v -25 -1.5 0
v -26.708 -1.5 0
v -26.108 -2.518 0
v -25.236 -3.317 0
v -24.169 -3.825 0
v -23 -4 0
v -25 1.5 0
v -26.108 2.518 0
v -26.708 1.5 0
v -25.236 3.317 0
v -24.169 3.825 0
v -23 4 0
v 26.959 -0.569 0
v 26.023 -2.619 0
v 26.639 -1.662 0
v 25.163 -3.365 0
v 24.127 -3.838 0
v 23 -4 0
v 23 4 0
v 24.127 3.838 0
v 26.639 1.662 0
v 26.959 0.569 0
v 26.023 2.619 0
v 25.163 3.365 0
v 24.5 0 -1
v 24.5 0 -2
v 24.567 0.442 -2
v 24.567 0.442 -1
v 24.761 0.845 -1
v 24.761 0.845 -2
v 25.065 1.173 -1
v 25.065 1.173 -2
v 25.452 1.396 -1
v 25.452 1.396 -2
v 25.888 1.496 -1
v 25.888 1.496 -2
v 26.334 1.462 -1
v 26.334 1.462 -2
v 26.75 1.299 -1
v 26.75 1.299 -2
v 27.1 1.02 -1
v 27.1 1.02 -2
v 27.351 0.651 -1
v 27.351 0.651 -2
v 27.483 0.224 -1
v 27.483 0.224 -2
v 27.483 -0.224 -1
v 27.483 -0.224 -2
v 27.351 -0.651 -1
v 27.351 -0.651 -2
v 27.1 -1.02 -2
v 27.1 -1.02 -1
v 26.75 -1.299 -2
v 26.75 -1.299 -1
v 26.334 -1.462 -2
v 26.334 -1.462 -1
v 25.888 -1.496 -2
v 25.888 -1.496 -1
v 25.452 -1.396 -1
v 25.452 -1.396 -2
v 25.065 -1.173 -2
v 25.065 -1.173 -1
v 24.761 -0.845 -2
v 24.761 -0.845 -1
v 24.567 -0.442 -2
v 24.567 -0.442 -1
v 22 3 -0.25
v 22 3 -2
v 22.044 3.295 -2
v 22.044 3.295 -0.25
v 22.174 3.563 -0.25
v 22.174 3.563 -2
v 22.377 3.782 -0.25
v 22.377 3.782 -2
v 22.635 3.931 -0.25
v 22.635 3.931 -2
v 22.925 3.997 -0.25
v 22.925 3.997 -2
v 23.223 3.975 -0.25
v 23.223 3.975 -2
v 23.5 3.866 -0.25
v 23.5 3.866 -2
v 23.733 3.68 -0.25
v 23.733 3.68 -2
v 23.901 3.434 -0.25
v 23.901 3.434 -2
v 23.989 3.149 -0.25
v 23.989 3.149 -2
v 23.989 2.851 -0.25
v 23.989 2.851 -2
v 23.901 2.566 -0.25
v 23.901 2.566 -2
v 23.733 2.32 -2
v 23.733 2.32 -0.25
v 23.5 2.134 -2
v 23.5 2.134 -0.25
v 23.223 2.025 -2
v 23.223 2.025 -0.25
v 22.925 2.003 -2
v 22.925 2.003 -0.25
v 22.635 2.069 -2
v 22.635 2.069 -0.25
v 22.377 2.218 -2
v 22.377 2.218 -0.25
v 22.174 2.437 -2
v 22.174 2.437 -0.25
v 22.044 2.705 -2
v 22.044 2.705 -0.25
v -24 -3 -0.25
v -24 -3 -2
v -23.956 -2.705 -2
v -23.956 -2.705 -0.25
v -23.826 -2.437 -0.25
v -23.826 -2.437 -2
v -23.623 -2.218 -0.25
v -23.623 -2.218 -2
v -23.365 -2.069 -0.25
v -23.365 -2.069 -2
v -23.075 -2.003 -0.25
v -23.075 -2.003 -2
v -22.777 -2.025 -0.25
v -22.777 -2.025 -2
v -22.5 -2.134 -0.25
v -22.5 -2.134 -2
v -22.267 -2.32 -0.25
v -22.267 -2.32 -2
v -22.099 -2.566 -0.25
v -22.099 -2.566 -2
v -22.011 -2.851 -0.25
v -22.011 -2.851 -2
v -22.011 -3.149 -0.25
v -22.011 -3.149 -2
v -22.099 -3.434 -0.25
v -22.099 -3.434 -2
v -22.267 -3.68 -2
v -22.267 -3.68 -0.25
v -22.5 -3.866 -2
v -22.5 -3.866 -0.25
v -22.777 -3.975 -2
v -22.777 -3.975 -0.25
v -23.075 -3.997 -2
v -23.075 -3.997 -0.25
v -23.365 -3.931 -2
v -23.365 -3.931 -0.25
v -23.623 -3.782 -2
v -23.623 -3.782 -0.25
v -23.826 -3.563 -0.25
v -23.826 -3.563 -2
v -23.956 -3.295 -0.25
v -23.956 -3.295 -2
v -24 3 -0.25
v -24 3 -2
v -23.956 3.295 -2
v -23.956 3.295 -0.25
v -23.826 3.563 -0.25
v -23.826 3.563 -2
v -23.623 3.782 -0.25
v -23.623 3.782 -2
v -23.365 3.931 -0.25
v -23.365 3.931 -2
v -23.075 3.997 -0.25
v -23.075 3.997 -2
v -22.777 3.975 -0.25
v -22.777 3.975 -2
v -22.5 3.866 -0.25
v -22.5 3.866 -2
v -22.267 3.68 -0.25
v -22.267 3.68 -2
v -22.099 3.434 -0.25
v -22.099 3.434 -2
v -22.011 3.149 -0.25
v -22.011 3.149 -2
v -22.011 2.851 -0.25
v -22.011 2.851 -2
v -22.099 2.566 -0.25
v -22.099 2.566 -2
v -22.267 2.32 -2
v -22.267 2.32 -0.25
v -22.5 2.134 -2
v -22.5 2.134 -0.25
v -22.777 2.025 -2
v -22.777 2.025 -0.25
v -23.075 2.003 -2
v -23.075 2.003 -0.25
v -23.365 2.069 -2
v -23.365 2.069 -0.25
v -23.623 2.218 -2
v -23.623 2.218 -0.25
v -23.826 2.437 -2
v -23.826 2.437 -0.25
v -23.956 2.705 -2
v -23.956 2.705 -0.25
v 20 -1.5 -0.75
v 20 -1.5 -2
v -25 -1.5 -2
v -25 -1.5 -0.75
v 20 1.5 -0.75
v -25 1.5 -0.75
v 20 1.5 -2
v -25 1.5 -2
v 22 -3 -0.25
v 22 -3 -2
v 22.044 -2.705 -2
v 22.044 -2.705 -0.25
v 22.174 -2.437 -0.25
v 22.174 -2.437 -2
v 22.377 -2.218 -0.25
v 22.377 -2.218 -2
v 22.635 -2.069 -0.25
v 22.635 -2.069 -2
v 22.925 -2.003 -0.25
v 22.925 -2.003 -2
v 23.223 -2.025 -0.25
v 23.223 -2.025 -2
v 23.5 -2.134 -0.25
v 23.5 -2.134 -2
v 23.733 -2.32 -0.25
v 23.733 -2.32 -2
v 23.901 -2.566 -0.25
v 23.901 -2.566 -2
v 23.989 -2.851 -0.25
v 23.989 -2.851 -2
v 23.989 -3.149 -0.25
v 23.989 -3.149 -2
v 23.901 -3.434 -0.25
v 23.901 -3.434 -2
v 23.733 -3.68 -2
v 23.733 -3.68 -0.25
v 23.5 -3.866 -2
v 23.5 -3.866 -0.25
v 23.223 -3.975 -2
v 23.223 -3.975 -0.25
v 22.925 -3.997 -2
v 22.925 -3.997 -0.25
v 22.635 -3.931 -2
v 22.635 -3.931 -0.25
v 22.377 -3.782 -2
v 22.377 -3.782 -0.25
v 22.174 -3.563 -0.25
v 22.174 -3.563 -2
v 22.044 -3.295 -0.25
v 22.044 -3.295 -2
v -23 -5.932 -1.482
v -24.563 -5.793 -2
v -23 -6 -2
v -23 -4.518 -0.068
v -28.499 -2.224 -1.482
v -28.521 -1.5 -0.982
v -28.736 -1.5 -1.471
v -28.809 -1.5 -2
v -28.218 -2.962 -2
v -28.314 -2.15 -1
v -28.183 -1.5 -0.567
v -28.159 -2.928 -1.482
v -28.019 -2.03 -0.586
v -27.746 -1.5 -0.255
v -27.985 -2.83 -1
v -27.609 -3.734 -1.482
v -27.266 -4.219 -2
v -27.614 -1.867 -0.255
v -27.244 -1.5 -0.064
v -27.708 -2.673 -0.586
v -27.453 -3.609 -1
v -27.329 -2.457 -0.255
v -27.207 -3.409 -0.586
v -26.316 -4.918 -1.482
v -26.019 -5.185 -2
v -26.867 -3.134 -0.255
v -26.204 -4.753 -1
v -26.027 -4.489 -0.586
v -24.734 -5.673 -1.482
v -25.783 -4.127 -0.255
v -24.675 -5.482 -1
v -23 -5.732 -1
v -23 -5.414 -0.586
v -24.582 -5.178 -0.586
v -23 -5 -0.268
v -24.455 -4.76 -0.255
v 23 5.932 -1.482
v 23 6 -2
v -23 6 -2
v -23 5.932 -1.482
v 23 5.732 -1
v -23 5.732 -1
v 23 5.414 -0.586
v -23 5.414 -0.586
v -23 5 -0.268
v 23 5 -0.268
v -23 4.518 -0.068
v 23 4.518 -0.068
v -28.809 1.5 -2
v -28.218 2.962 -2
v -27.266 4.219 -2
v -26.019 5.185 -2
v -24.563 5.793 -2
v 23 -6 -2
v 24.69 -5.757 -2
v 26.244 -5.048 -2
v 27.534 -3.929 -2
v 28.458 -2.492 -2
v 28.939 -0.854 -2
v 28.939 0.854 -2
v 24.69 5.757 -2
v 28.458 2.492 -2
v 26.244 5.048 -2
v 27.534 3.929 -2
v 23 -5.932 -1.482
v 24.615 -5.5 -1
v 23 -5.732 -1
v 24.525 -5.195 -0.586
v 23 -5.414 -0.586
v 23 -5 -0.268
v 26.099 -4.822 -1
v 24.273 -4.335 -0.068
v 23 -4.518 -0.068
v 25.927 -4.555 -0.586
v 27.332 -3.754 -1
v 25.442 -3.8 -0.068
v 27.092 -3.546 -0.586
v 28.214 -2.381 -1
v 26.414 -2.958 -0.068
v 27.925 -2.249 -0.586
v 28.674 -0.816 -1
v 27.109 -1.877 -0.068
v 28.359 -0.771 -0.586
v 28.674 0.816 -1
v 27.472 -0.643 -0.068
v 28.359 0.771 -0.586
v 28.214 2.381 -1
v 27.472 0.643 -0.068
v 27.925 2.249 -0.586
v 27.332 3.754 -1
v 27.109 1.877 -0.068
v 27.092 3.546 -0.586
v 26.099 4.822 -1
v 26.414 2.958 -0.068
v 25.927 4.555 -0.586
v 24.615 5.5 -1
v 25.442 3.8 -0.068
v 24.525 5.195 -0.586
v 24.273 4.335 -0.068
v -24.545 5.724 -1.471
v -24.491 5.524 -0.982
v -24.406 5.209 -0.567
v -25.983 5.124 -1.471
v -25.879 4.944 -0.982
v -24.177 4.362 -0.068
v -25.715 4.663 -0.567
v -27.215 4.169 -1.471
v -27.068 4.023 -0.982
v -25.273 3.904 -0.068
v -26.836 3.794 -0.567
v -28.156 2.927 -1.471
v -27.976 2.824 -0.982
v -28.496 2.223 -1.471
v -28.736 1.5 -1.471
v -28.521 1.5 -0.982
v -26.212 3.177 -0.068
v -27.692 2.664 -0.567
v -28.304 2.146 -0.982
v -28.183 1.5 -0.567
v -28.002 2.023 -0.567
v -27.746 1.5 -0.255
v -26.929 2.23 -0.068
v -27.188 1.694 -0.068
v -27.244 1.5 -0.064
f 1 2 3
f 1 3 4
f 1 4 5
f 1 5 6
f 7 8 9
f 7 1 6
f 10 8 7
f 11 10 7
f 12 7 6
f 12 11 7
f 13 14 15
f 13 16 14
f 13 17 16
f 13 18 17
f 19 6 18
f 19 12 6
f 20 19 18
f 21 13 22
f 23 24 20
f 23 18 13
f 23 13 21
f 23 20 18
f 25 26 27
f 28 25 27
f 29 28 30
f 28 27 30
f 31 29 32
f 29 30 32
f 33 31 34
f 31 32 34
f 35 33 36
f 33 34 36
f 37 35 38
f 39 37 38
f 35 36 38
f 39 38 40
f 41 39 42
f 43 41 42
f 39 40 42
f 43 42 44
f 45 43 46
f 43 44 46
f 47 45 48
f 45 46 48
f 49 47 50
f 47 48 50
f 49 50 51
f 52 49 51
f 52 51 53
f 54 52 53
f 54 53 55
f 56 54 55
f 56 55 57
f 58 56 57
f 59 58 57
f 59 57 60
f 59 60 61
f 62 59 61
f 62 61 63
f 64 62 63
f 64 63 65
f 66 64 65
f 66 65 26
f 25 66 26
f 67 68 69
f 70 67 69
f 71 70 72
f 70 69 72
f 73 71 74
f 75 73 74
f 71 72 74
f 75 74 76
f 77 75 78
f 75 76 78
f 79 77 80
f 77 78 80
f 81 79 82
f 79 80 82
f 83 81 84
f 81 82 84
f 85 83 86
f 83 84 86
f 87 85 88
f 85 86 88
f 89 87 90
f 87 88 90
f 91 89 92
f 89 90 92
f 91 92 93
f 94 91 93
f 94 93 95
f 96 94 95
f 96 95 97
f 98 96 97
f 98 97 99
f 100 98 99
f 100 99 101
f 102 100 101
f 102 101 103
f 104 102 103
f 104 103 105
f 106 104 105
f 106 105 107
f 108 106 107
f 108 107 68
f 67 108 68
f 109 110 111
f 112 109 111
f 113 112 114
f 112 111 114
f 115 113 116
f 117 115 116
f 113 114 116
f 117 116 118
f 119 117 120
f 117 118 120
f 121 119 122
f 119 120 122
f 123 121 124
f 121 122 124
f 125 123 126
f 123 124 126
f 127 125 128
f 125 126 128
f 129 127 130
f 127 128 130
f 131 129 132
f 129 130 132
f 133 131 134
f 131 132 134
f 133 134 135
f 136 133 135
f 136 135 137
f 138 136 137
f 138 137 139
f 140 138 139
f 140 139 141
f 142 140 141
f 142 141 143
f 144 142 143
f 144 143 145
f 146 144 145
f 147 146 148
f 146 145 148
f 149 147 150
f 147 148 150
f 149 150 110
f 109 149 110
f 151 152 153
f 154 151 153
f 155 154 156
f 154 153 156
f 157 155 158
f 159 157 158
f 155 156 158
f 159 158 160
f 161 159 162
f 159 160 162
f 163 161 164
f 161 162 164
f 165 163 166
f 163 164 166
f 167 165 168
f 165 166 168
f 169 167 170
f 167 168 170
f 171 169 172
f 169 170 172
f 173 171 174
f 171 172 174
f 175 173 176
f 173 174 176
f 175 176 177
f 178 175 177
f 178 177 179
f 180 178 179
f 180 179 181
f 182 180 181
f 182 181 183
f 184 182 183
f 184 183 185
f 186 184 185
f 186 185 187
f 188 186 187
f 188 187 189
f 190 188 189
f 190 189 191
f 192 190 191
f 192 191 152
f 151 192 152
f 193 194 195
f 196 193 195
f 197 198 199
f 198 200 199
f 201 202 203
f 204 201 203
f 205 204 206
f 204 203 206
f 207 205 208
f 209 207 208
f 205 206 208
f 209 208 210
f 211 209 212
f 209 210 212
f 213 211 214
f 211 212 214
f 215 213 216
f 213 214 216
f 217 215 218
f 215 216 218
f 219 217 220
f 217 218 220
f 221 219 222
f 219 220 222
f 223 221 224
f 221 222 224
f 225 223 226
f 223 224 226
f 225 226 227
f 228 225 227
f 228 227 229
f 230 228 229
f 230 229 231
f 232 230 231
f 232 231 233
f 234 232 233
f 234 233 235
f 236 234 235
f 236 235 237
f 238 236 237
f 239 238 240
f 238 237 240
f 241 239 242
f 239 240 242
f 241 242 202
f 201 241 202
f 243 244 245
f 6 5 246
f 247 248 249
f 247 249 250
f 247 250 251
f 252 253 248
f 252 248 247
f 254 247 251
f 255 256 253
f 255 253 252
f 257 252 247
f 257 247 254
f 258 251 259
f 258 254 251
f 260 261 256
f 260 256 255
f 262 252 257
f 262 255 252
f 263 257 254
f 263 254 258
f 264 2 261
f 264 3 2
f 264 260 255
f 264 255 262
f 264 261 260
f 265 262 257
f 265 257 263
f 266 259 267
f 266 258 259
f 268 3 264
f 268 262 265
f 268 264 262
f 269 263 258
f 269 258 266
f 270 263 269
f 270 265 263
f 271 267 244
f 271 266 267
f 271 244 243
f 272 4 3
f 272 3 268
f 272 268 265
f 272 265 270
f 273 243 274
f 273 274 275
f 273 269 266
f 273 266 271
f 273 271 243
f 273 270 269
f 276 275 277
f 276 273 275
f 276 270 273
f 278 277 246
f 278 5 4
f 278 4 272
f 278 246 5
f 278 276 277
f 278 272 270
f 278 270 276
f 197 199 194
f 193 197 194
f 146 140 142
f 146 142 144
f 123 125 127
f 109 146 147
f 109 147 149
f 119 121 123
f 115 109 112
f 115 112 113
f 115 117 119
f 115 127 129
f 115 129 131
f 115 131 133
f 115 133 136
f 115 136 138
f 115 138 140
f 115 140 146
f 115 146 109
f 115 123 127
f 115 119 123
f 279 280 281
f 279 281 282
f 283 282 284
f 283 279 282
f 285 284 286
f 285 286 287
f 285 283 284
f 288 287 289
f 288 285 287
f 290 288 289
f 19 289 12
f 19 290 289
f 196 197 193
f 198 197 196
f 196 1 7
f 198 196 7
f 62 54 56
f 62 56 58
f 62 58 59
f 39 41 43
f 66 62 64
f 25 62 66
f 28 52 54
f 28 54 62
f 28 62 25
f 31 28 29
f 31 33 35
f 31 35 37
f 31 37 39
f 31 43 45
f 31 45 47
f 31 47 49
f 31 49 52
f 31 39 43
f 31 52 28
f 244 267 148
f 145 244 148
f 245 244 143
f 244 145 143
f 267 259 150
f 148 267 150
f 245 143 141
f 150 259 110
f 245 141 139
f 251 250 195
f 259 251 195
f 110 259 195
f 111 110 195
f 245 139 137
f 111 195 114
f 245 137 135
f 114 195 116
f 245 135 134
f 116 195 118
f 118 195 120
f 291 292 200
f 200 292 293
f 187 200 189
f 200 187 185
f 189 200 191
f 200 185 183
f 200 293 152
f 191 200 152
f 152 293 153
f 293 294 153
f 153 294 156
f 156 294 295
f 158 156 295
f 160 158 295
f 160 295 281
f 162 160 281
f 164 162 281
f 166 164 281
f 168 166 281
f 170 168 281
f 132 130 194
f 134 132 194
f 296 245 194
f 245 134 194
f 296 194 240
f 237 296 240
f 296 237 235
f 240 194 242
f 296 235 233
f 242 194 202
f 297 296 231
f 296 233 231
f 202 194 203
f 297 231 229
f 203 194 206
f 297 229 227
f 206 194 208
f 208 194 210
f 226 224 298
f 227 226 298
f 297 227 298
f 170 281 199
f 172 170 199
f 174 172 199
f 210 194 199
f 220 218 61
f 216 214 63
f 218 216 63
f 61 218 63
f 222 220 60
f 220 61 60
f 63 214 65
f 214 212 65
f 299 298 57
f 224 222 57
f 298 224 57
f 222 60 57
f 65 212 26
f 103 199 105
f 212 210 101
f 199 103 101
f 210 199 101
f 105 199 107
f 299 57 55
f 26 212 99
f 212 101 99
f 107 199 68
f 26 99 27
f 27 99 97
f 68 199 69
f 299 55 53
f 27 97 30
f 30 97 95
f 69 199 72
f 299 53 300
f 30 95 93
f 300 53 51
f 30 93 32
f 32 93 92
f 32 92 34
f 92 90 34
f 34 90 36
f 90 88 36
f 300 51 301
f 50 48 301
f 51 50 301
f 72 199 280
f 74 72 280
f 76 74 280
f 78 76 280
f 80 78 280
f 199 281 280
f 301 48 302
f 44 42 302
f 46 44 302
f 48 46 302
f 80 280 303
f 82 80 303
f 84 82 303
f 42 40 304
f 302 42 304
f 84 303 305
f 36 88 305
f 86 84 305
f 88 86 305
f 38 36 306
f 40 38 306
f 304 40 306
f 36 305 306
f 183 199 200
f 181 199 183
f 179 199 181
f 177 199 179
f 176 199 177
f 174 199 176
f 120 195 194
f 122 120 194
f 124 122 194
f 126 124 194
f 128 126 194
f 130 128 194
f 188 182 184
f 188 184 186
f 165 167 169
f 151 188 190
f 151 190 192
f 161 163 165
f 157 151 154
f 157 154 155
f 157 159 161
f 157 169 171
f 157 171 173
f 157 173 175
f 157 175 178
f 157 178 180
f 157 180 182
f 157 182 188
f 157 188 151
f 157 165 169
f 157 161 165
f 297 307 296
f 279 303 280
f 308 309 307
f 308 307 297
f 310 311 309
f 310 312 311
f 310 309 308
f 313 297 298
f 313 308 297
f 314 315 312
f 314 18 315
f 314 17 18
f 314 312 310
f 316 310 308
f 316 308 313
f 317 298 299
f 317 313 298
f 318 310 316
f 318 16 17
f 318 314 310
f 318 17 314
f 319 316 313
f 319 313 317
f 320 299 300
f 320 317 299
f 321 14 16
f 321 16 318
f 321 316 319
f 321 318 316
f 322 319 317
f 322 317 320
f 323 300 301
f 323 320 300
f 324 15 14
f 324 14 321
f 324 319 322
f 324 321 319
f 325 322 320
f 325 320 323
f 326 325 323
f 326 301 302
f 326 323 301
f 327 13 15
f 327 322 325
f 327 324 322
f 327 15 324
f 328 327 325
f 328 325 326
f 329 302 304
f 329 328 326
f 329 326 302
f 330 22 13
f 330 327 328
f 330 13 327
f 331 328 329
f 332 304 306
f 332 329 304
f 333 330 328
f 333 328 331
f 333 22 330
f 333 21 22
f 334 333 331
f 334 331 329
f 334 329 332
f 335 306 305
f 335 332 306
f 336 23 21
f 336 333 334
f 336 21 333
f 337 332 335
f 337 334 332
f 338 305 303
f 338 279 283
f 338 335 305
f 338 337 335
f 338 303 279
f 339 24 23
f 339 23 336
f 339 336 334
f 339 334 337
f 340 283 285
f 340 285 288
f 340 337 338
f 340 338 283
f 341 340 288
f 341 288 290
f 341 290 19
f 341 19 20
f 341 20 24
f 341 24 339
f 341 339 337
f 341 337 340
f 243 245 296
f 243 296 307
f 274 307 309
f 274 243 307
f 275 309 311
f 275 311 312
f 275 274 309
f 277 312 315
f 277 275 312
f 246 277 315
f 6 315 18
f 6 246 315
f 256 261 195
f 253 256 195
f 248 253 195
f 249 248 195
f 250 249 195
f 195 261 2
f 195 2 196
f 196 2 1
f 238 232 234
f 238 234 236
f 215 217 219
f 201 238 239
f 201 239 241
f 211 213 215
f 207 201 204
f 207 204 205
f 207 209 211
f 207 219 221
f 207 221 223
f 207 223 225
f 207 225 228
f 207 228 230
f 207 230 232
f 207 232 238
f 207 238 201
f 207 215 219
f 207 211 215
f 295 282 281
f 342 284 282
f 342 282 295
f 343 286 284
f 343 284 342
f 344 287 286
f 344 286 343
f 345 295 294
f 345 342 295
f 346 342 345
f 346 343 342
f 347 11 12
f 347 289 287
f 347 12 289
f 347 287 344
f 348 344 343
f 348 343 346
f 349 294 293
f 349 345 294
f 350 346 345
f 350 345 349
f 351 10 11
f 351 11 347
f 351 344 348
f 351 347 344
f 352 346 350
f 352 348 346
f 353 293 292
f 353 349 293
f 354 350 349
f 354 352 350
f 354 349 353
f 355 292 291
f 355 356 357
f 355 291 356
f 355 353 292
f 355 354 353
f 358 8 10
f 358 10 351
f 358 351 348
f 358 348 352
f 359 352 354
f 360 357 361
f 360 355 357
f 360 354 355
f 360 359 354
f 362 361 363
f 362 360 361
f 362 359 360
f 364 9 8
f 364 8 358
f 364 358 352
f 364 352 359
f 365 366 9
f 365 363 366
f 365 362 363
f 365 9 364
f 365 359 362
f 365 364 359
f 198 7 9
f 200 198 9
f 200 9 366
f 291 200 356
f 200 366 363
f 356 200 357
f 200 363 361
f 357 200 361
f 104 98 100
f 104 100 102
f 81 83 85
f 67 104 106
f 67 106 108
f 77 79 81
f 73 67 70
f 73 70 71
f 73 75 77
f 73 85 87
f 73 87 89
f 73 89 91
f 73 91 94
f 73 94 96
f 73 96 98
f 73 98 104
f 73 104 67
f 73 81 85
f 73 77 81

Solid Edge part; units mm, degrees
sketch "Sketch1" plane through (0, 0, 0) normal (0, 0, 1) x (1, 0, 0)
  line L0 (-23, -6) -> (23, -6)
  arc A0 (23, 6) -> (23, -6) centre (23, 0) cw
  line L1 (23, 6) -> (-23, 6)
  arc A1 (-23, 6) -> (-23, -6) centre (-23, 0) ccw
  arc A2 (-28.8095, 1.5) -> (-28.8095, -1.5) centre (-23, 0) ccw
  line L2 (-28.8095, -1.5) -> (-25, -1.5)
  line L3 (-25, -1.5) -> (-25, 1.5)
  line L4 (-25, 1.5) -> (-28.8095, 1.5)
extrude "Protrusion1" add sketch "Sketch1" against normal blind 2
fillet "Round_1" radius 2 4 edges at (0, -6, 0) (29, 0, 0) (0, 6, 0) (-29, 0, 0)
sketch "Sketch2" plane through (0, 0, 0) normal (0, 0, 1) x (1, 0, 0)
  line L0 (-28.8095, -1.5) -> (-25, -1.5)
  line L1 (-25, -1.5) -> (-25, 1.5)
  line L2 (-25, 1.5) -> (-28.8095, 1.5)
  arc A0 (-28.8095, 1.5) -> (-28.8095, -1.5) centre (-23, 0) ccw
extrude "ExtrudedCutout_1" cut sketch "Sketch2" against normal blind 2
sketch "Sketch3" plane through (0.0953, 0, -2) normal (0, 0, -1) x (-1, 0, 0)
  line L0 (-19.9047, -1.5) -> (25.0953, -1.5)
  line L1 (25.0953, -1.5) -> (25.0953, 1.5)
  line L2 (25.0953, 1.5) -> (-19.9047, 1.5)
  line L3 (-19.9047, 1.5) -> (-19.9047, -1.5)
extrude "ExtrudedCutout_2" cut sketch "Sketch3" against normal blind 1.25
sketch "Sketch4" plane through (0.0953, 0, -2) normal (0, 0, -1) x (-1, 0, 0)
  circle A0 centre (23.0953, -3) radius 1
extrude "ExtrudedCutout_3" cut sketch "Sketch4" against normal blind 1.75
sketch "Sketch5" plane through (0.0953, 0, -2) normal (0, 0, -1) x (-1, 0, 0)
  circle A0 centre (23.0953, 3) radius 1
extrude "ExtrudedCutout_4" cut sketch "Sketch5" against normal blind 1.75
sketch "Sketch6" plane through (0.0953, 0, -2) normal (0, 0, -1) x (-1, 0, 0)
  circle A0 centre (-22.9047, -3) radius 1
extrude "ExtrudedCutout_6" cut sketch "Sketch6" against normal blind 1.75
sketch "Sketch7" plane through (0.0953, 0, -2) normal (0, 0, -1) x (-1, 0, 0)
  circle A0 centre (-22.9047, 3) radius 1
extrude "ExtrudedCutout_7" cut sketch "Sketch7" against normal blind 1.75
sketch "Sketch8" plane through (0.0953, 0, -2) normal (0, 0, -1) x (-1, 0, 0)
  circle A0 centre (-25.9047, 0) radius 1.5
extrude "ExtrudedCutout_8" cut sketch "Sketch8" against normal blind 1
